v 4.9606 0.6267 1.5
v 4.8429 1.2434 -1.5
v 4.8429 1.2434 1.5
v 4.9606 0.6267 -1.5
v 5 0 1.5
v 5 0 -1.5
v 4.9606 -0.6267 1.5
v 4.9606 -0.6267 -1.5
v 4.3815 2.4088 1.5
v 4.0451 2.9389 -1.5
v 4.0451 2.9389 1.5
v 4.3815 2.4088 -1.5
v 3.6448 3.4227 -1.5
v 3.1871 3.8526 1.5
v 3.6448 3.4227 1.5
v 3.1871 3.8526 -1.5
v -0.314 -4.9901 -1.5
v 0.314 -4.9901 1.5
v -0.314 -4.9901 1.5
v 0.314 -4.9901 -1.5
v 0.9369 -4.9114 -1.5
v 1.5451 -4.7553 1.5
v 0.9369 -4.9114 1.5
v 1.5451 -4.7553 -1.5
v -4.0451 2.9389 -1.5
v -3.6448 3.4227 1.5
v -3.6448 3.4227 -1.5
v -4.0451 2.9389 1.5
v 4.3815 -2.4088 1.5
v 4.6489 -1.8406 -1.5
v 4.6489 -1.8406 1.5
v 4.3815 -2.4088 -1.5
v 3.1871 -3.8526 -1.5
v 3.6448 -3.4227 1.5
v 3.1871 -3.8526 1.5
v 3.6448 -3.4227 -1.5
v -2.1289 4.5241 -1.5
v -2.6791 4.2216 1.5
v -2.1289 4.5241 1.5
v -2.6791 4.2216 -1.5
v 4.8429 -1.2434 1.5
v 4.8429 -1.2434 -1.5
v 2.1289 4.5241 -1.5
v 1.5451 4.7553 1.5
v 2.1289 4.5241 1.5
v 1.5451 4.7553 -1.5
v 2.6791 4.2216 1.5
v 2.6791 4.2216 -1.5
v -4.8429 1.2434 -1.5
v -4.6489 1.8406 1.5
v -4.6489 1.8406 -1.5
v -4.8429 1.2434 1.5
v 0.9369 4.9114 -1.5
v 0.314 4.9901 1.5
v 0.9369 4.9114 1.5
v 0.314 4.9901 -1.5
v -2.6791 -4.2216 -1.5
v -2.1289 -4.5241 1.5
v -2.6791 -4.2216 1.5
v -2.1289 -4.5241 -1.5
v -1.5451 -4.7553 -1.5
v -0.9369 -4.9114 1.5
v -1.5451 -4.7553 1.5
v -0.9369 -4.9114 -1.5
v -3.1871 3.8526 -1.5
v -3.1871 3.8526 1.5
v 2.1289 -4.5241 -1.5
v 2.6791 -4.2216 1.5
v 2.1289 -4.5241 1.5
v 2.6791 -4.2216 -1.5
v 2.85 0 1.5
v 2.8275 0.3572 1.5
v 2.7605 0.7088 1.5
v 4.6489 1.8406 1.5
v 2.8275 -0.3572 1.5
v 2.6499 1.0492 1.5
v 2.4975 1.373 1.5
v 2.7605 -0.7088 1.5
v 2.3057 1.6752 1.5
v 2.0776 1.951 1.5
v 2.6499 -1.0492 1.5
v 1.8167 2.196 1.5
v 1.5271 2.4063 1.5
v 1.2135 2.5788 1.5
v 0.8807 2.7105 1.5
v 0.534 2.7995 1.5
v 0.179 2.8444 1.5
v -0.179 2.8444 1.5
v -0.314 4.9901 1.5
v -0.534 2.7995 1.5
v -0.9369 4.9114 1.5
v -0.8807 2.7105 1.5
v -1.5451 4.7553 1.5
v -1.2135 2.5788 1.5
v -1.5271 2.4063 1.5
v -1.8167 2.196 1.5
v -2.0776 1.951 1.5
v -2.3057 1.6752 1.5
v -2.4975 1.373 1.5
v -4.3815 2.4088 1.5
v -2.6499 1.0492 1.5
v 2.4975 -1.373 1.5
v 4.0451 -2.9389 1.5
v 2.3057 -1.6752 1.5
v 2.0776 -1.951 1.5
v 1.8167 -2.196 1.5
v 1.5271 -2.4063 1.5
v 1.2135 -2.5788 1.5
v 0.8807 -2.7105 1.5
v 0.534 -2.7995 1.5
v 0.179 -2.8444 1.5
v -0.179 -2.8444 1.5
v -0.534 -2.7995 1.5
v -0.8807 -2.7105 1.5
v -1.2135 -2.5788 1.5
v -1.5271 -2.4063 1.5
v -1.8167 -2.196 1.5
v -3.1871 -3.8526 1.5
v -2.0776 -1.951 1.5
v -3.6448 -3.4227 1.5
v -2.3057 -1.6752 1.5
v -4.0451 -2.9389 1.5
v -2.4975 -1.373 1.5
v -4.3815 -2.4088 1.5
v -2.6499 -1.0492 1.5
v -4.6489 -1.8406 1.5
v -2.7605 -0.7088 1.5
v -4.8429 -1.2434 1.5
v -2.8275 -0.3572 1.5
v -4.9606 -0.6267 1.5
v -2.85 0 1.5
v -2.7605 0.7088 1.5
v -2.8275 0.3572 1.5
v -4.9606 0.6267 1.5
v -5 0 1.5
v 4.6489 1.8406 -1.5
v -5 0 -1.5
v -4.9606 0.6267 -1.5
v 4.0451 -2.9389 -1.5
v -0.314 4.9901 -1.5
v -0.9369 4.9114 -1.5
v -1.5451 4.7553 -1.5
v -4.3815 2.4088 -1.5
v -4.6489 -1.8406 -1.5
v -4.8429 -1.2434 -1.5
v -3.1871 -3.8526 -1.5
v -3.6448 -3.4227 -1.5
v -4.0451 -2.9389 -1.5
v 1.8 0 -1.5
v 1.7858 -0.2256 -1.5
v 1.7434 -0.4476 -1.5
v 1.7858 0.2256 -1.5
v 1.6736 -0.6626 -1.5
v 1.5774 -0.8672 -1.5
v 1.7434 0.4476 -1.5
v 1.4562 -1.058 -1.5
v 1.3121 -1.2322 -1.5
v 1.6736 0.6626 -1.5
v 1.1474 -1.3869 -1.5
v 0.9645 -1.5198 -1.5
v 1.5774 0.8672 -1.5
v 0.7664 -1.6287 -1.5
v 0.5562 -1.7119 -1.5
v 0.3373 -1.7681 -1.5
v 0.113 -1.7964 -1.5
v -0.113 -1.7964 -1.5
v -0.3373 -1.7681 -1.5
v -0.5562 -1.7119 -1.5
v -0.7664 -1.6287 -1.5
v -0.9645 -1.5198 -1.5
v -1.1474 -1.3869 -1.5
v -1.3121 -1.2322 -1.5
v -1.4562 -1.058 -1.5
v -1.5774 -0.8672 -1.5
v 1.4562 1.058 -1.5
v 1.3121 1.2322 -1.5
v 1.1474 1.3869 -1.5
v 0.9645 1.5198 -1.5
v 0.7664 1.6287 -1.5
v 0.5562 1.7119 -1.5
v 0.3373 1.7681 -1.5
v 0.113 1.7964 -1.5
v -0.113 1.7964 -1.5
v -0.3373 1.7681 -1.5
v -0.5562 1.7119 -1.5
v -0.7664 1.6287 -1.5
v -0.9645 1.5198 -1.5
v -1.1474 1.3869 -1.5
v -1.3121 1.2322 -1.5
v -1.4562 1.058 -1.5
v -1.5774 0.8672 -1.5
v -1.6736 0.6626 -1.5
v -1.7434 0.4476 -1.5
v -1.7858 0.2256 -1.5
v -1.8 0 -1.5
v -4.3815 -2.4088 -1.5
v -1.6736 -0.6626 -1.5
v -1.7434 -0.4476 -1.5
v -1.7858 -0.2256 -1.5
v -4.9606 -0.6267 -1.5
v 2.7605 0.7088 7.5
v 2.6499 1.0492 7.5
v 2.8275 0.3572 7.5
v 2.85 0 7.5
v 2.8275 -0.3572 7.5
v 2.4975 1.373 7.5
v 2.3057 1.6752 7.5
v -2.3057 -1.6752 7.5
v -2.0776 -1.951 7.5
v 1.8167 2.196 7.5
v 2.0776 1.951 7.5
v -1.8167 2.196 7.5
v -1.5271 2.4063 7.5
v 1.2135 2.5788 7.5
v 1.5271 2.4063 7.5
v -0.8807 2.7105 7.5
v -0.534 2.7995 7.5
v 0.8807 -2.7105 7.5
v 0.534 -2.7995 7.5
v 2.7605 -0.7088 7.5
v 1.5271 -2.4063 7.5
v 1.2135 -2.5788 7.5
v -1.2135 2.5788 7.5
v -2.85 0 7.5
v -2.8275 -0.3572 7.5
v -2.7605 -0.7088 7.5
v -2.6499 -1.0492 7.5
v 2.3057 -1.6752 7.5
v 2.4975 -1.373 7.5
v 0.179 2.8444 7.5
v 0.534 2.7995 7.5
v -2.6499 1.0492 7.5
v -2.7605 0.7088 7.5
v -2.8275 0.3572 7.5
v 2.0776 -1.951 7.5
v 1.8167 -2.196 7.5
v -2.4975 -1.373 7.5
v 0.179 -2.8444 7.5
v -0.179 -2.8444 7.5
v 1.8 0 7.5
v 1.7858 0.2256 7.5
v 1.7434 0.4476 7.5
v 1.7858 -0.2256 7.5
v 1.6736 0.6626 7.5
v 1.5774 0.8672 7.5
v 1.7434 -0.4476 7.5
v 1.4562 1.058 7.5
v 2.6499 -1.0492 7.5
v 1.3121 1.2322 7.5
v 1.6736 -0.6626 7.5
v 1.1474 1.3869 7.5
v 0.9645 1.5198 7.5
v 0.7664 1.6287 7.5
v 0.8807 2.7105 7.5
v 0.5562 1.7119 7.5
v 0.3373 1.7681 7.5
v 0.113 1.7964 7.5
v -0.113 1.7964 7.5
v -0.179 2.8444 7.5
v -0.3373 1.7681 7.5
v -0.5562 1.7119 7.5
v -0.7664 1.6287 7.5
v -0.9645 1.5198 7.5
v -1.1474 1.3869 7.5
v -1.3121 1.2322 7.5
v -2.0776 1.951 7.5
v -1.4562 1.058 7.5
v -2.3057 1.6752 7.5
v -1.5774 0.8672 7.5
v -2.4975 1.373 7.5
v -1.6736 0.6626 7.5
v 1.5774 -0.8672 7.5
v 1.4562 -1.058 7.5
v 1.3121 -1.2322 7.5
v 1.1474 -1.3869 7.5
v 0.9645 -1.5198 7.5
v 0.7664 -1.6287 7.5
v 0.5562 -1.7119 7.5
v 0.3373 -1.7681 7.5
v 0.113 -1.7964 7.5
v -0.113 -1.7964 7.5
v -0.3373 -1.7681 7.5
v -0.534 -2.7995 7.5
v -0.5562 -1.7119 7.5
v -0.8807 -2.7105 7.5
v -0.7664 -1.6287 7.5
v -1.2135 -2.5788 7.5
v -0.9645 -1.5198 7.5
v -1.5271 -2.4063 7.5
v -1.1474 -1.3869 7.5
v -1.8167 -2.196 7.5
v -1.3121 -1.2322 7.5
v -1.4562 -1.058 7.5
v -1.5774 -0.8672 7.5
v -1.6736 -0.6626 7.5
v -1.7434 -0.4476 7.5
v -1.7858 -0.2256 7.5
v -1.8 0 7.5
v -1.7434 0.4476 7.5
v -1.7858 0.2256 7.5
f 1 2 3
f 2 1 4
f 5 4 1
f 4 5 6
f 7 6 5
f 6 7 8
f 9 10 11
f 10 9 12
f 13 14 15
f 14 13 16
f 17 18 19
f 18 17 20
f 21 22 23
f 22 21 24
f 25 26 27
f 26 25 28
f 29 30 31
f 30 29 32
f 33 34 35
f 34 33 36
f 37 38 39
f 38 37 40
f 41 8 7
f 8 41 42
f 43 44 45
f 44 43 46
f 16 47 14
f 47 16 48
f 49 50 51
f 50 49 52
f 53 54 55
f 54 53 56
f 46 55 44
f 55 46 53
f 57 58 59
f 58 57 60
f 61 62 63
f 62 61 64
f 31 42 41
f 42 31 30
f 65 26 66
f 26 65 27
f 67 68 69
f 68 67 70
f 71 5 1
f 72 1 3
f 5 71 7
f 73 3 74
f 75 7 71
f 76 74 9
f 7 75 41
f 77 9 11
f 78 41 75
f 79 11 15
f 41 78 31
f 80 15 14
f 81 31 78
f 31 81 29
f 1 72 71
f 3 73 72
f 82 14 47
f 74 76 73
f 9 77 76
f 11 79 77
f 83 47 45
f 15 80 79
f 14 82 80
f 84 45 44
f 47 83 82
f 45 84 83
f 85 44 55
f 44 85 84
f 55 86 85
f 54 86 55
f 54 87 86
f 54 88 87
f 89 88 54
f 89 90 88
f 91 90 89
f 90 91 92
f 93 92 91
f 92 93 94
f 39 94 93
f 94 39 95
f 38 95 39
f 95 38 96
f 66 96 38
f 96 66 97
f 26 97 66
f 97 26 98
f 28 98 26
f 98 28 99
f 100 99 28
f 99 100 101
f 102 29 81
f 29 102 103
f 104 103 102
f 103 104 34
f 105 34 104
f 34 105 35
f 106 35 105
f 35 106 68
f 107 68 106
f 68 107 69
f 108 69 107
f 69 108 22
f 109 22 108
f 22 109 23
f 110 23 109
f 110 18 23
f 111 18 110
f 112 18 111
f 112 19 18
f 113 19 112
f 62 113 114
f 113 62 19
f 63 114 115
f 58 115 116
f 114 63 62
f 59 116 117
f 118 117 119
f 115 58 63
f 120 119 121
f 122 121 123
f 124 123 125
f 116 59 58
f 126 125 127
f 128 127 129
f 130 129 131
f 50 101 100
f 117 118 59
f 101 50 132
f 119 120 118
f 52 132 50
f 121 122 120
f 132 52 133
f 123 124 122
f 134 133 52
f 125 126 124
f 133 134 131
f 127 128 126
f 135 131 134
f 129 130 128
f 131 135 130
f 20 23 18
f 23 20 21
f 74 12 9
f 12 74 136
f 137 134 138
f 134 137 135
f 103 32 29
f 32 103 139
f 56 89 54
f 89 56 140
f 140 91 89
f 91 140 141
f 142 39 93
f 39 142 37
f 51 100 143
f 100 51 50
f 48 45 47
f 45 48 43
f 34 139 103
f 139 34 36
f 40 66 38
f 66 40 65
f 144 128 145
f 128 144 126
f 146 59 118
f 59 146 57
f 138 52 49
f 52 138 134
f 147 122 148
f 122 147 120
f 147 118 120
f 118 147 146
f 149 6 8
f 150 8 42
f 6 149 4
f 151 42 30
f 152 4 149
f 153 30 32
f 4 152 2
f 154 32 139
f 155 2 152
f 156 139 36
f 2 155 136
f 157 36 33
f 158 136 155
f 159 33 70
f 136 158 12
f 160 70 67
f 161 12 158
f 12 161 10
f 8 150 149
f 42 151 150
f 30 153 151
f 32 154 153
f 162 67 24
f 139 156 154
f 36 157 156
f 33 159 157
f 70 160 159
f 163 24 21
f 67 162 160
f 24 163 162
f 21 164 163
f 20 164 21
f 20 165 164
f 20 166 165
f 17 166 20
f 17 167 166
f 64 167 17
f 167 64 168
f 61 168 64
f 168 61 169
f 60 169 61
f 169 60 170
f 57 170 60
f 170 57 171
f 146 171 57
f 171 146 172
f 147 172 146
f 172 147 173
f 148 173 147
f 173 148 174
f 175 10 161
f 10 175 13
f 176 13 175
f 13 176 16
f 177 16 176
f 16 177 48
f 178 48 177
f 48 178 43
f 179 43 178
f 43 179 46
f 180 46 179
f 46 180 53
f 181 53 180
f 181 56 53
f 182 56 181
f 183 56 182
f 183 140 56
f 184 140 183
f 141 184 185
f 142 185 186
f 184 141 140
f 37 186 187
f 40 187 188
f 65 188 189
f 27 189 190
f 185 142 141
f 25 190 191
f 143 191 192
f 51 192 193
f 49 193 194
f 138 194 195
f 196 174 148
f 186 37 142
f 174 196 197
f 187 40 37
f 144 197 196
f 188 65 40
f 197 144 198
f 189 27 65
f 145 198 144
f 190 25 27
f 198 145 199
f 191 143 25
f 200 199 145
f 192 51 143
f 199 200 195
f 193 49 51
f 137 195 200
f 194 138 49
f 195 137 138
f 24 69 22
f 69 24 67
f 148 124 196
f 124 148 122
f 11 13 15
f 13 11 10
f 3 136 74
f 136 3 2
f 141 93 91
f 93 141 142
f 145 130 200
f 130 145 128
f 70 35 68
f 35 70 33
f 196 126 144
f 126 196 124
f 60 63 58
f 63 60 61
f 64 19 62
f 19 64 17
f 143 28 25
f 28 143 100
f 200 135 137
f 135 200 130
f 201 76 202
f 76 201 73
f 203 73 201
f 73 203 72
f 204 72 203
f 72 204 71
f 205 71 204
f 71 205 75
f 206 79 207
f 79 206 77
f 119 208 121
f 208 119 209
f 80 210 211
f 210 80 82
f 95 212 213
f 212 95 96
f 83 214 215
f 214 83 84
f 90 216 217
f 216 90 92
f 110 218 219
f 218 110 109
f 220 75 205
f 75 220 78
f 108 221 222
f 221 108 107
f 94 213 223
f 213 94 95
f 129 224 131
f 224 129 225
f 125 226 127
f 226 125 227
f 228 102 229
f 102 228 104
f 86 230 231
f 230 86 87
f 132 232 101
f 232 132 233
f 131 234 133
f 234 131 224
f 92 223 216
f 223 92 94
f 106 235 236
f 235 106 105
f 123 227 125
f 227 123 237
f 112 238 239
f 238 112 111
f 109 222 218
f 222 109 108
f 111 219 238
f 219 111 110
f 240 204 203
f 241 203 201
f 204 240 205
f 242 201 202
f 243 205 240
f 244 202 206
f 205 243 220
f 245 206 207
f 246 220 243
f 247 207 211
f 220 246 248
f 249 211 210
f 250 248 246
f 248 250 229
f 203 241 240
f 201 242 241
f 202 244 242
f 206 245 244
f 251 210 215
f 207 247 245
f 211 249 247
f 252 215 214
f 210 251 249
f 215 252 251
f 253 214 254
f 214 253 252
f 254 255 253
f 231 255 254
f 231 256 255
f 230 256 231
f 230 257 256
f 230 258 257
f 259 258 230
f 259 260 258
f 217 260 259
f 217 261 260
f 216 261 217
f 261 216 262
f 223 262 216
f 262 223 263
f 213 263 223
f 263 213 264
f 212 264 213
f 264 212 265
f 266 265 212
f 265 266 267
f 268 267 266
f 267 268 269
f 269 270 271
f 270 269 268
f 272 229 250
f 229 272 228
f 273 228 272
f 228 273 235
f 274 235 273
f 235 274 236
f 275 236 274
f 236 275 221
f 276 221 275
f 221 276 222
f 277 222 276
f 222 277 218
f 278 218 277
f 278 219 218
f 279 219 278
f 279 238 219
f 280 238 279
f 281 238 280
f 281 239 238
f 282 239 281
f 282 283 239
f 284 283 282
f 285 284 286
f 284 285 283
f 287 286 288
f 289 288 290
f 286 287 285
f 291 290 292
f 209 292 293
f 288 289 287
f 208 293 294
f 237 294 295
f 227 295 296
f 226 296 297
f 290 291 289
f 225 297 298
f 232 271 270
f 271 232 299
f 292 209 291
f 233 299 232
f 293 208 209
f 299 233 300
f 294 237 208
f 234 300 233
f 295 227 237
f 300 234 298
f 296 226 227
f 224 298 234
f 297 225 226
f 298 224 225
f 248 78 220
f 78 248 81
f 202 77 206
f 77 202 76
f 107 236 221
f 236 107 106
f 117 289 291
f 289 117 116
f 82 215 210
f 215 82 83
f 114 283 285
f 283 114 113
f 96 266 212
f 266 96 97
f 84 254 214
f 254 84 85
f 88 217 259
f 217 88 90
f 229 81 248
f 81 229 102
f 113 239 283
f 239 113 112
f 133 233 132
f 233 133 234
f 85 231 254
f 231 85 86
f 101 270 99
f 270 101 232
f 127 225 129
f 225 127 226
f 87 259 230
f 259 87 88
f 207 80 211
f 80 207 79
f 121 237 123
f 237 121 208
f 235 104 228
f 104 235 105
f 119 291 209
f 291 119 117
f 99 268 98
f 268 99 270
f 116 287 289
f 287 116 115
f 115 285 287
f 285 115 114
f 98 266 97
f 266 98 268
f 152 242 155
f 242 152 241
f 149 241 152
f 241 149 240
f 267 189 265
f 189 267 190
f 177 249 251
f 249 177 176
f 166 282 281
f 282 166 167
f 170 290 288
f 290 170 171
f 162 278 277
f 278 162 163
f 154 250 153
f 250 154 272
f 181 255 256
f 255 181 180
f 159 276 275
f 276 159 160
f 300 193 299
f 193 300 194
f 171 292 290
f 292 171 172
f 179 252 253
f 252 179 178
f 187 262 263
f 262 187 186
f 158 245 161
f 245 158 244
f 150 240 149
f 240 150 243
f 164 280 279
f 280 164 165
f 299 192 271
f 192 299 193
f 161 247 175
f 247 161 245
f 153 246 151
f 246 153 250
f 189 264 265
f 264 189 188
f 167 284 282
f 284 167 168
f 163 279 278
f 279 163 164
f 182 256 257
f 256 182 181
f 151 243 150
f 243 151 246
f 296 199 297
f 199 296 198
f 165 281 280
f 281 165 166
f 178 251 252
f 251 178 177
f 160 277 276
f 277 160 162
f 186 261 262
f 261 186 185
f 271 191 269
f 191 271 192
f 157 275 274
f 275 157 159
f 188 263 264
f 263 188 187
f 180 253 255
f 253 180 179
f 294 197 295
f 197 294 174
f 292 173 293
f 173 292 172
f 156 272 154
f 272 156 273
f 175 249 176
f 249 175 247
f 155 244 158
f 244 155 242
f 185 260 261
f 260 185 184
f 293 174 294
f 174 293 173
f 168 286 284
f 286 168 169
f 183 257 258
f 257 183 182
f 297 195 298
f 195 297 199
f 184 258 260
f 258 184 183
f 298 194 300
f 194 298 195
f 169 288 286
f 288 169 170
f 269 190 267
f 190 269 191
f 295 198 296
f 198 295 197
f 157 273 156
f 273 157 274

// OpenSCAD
$fn = 50;


difference() {
	union() {
		translate(v = [0, 0, -1.5000000000]) {
			cylinder(h = 3, r = 5.0000000000);
		}
		translate(v = [0, 0, -1.5000000000]) {
			cylinder(h = 9, r = 2.8500000000);
		}
	}
	union() {
		translate(v = [0, 0, -50.0000000000]) {
			cylinder(h = 100, r = 1.8000000000);
		}
	}
}
